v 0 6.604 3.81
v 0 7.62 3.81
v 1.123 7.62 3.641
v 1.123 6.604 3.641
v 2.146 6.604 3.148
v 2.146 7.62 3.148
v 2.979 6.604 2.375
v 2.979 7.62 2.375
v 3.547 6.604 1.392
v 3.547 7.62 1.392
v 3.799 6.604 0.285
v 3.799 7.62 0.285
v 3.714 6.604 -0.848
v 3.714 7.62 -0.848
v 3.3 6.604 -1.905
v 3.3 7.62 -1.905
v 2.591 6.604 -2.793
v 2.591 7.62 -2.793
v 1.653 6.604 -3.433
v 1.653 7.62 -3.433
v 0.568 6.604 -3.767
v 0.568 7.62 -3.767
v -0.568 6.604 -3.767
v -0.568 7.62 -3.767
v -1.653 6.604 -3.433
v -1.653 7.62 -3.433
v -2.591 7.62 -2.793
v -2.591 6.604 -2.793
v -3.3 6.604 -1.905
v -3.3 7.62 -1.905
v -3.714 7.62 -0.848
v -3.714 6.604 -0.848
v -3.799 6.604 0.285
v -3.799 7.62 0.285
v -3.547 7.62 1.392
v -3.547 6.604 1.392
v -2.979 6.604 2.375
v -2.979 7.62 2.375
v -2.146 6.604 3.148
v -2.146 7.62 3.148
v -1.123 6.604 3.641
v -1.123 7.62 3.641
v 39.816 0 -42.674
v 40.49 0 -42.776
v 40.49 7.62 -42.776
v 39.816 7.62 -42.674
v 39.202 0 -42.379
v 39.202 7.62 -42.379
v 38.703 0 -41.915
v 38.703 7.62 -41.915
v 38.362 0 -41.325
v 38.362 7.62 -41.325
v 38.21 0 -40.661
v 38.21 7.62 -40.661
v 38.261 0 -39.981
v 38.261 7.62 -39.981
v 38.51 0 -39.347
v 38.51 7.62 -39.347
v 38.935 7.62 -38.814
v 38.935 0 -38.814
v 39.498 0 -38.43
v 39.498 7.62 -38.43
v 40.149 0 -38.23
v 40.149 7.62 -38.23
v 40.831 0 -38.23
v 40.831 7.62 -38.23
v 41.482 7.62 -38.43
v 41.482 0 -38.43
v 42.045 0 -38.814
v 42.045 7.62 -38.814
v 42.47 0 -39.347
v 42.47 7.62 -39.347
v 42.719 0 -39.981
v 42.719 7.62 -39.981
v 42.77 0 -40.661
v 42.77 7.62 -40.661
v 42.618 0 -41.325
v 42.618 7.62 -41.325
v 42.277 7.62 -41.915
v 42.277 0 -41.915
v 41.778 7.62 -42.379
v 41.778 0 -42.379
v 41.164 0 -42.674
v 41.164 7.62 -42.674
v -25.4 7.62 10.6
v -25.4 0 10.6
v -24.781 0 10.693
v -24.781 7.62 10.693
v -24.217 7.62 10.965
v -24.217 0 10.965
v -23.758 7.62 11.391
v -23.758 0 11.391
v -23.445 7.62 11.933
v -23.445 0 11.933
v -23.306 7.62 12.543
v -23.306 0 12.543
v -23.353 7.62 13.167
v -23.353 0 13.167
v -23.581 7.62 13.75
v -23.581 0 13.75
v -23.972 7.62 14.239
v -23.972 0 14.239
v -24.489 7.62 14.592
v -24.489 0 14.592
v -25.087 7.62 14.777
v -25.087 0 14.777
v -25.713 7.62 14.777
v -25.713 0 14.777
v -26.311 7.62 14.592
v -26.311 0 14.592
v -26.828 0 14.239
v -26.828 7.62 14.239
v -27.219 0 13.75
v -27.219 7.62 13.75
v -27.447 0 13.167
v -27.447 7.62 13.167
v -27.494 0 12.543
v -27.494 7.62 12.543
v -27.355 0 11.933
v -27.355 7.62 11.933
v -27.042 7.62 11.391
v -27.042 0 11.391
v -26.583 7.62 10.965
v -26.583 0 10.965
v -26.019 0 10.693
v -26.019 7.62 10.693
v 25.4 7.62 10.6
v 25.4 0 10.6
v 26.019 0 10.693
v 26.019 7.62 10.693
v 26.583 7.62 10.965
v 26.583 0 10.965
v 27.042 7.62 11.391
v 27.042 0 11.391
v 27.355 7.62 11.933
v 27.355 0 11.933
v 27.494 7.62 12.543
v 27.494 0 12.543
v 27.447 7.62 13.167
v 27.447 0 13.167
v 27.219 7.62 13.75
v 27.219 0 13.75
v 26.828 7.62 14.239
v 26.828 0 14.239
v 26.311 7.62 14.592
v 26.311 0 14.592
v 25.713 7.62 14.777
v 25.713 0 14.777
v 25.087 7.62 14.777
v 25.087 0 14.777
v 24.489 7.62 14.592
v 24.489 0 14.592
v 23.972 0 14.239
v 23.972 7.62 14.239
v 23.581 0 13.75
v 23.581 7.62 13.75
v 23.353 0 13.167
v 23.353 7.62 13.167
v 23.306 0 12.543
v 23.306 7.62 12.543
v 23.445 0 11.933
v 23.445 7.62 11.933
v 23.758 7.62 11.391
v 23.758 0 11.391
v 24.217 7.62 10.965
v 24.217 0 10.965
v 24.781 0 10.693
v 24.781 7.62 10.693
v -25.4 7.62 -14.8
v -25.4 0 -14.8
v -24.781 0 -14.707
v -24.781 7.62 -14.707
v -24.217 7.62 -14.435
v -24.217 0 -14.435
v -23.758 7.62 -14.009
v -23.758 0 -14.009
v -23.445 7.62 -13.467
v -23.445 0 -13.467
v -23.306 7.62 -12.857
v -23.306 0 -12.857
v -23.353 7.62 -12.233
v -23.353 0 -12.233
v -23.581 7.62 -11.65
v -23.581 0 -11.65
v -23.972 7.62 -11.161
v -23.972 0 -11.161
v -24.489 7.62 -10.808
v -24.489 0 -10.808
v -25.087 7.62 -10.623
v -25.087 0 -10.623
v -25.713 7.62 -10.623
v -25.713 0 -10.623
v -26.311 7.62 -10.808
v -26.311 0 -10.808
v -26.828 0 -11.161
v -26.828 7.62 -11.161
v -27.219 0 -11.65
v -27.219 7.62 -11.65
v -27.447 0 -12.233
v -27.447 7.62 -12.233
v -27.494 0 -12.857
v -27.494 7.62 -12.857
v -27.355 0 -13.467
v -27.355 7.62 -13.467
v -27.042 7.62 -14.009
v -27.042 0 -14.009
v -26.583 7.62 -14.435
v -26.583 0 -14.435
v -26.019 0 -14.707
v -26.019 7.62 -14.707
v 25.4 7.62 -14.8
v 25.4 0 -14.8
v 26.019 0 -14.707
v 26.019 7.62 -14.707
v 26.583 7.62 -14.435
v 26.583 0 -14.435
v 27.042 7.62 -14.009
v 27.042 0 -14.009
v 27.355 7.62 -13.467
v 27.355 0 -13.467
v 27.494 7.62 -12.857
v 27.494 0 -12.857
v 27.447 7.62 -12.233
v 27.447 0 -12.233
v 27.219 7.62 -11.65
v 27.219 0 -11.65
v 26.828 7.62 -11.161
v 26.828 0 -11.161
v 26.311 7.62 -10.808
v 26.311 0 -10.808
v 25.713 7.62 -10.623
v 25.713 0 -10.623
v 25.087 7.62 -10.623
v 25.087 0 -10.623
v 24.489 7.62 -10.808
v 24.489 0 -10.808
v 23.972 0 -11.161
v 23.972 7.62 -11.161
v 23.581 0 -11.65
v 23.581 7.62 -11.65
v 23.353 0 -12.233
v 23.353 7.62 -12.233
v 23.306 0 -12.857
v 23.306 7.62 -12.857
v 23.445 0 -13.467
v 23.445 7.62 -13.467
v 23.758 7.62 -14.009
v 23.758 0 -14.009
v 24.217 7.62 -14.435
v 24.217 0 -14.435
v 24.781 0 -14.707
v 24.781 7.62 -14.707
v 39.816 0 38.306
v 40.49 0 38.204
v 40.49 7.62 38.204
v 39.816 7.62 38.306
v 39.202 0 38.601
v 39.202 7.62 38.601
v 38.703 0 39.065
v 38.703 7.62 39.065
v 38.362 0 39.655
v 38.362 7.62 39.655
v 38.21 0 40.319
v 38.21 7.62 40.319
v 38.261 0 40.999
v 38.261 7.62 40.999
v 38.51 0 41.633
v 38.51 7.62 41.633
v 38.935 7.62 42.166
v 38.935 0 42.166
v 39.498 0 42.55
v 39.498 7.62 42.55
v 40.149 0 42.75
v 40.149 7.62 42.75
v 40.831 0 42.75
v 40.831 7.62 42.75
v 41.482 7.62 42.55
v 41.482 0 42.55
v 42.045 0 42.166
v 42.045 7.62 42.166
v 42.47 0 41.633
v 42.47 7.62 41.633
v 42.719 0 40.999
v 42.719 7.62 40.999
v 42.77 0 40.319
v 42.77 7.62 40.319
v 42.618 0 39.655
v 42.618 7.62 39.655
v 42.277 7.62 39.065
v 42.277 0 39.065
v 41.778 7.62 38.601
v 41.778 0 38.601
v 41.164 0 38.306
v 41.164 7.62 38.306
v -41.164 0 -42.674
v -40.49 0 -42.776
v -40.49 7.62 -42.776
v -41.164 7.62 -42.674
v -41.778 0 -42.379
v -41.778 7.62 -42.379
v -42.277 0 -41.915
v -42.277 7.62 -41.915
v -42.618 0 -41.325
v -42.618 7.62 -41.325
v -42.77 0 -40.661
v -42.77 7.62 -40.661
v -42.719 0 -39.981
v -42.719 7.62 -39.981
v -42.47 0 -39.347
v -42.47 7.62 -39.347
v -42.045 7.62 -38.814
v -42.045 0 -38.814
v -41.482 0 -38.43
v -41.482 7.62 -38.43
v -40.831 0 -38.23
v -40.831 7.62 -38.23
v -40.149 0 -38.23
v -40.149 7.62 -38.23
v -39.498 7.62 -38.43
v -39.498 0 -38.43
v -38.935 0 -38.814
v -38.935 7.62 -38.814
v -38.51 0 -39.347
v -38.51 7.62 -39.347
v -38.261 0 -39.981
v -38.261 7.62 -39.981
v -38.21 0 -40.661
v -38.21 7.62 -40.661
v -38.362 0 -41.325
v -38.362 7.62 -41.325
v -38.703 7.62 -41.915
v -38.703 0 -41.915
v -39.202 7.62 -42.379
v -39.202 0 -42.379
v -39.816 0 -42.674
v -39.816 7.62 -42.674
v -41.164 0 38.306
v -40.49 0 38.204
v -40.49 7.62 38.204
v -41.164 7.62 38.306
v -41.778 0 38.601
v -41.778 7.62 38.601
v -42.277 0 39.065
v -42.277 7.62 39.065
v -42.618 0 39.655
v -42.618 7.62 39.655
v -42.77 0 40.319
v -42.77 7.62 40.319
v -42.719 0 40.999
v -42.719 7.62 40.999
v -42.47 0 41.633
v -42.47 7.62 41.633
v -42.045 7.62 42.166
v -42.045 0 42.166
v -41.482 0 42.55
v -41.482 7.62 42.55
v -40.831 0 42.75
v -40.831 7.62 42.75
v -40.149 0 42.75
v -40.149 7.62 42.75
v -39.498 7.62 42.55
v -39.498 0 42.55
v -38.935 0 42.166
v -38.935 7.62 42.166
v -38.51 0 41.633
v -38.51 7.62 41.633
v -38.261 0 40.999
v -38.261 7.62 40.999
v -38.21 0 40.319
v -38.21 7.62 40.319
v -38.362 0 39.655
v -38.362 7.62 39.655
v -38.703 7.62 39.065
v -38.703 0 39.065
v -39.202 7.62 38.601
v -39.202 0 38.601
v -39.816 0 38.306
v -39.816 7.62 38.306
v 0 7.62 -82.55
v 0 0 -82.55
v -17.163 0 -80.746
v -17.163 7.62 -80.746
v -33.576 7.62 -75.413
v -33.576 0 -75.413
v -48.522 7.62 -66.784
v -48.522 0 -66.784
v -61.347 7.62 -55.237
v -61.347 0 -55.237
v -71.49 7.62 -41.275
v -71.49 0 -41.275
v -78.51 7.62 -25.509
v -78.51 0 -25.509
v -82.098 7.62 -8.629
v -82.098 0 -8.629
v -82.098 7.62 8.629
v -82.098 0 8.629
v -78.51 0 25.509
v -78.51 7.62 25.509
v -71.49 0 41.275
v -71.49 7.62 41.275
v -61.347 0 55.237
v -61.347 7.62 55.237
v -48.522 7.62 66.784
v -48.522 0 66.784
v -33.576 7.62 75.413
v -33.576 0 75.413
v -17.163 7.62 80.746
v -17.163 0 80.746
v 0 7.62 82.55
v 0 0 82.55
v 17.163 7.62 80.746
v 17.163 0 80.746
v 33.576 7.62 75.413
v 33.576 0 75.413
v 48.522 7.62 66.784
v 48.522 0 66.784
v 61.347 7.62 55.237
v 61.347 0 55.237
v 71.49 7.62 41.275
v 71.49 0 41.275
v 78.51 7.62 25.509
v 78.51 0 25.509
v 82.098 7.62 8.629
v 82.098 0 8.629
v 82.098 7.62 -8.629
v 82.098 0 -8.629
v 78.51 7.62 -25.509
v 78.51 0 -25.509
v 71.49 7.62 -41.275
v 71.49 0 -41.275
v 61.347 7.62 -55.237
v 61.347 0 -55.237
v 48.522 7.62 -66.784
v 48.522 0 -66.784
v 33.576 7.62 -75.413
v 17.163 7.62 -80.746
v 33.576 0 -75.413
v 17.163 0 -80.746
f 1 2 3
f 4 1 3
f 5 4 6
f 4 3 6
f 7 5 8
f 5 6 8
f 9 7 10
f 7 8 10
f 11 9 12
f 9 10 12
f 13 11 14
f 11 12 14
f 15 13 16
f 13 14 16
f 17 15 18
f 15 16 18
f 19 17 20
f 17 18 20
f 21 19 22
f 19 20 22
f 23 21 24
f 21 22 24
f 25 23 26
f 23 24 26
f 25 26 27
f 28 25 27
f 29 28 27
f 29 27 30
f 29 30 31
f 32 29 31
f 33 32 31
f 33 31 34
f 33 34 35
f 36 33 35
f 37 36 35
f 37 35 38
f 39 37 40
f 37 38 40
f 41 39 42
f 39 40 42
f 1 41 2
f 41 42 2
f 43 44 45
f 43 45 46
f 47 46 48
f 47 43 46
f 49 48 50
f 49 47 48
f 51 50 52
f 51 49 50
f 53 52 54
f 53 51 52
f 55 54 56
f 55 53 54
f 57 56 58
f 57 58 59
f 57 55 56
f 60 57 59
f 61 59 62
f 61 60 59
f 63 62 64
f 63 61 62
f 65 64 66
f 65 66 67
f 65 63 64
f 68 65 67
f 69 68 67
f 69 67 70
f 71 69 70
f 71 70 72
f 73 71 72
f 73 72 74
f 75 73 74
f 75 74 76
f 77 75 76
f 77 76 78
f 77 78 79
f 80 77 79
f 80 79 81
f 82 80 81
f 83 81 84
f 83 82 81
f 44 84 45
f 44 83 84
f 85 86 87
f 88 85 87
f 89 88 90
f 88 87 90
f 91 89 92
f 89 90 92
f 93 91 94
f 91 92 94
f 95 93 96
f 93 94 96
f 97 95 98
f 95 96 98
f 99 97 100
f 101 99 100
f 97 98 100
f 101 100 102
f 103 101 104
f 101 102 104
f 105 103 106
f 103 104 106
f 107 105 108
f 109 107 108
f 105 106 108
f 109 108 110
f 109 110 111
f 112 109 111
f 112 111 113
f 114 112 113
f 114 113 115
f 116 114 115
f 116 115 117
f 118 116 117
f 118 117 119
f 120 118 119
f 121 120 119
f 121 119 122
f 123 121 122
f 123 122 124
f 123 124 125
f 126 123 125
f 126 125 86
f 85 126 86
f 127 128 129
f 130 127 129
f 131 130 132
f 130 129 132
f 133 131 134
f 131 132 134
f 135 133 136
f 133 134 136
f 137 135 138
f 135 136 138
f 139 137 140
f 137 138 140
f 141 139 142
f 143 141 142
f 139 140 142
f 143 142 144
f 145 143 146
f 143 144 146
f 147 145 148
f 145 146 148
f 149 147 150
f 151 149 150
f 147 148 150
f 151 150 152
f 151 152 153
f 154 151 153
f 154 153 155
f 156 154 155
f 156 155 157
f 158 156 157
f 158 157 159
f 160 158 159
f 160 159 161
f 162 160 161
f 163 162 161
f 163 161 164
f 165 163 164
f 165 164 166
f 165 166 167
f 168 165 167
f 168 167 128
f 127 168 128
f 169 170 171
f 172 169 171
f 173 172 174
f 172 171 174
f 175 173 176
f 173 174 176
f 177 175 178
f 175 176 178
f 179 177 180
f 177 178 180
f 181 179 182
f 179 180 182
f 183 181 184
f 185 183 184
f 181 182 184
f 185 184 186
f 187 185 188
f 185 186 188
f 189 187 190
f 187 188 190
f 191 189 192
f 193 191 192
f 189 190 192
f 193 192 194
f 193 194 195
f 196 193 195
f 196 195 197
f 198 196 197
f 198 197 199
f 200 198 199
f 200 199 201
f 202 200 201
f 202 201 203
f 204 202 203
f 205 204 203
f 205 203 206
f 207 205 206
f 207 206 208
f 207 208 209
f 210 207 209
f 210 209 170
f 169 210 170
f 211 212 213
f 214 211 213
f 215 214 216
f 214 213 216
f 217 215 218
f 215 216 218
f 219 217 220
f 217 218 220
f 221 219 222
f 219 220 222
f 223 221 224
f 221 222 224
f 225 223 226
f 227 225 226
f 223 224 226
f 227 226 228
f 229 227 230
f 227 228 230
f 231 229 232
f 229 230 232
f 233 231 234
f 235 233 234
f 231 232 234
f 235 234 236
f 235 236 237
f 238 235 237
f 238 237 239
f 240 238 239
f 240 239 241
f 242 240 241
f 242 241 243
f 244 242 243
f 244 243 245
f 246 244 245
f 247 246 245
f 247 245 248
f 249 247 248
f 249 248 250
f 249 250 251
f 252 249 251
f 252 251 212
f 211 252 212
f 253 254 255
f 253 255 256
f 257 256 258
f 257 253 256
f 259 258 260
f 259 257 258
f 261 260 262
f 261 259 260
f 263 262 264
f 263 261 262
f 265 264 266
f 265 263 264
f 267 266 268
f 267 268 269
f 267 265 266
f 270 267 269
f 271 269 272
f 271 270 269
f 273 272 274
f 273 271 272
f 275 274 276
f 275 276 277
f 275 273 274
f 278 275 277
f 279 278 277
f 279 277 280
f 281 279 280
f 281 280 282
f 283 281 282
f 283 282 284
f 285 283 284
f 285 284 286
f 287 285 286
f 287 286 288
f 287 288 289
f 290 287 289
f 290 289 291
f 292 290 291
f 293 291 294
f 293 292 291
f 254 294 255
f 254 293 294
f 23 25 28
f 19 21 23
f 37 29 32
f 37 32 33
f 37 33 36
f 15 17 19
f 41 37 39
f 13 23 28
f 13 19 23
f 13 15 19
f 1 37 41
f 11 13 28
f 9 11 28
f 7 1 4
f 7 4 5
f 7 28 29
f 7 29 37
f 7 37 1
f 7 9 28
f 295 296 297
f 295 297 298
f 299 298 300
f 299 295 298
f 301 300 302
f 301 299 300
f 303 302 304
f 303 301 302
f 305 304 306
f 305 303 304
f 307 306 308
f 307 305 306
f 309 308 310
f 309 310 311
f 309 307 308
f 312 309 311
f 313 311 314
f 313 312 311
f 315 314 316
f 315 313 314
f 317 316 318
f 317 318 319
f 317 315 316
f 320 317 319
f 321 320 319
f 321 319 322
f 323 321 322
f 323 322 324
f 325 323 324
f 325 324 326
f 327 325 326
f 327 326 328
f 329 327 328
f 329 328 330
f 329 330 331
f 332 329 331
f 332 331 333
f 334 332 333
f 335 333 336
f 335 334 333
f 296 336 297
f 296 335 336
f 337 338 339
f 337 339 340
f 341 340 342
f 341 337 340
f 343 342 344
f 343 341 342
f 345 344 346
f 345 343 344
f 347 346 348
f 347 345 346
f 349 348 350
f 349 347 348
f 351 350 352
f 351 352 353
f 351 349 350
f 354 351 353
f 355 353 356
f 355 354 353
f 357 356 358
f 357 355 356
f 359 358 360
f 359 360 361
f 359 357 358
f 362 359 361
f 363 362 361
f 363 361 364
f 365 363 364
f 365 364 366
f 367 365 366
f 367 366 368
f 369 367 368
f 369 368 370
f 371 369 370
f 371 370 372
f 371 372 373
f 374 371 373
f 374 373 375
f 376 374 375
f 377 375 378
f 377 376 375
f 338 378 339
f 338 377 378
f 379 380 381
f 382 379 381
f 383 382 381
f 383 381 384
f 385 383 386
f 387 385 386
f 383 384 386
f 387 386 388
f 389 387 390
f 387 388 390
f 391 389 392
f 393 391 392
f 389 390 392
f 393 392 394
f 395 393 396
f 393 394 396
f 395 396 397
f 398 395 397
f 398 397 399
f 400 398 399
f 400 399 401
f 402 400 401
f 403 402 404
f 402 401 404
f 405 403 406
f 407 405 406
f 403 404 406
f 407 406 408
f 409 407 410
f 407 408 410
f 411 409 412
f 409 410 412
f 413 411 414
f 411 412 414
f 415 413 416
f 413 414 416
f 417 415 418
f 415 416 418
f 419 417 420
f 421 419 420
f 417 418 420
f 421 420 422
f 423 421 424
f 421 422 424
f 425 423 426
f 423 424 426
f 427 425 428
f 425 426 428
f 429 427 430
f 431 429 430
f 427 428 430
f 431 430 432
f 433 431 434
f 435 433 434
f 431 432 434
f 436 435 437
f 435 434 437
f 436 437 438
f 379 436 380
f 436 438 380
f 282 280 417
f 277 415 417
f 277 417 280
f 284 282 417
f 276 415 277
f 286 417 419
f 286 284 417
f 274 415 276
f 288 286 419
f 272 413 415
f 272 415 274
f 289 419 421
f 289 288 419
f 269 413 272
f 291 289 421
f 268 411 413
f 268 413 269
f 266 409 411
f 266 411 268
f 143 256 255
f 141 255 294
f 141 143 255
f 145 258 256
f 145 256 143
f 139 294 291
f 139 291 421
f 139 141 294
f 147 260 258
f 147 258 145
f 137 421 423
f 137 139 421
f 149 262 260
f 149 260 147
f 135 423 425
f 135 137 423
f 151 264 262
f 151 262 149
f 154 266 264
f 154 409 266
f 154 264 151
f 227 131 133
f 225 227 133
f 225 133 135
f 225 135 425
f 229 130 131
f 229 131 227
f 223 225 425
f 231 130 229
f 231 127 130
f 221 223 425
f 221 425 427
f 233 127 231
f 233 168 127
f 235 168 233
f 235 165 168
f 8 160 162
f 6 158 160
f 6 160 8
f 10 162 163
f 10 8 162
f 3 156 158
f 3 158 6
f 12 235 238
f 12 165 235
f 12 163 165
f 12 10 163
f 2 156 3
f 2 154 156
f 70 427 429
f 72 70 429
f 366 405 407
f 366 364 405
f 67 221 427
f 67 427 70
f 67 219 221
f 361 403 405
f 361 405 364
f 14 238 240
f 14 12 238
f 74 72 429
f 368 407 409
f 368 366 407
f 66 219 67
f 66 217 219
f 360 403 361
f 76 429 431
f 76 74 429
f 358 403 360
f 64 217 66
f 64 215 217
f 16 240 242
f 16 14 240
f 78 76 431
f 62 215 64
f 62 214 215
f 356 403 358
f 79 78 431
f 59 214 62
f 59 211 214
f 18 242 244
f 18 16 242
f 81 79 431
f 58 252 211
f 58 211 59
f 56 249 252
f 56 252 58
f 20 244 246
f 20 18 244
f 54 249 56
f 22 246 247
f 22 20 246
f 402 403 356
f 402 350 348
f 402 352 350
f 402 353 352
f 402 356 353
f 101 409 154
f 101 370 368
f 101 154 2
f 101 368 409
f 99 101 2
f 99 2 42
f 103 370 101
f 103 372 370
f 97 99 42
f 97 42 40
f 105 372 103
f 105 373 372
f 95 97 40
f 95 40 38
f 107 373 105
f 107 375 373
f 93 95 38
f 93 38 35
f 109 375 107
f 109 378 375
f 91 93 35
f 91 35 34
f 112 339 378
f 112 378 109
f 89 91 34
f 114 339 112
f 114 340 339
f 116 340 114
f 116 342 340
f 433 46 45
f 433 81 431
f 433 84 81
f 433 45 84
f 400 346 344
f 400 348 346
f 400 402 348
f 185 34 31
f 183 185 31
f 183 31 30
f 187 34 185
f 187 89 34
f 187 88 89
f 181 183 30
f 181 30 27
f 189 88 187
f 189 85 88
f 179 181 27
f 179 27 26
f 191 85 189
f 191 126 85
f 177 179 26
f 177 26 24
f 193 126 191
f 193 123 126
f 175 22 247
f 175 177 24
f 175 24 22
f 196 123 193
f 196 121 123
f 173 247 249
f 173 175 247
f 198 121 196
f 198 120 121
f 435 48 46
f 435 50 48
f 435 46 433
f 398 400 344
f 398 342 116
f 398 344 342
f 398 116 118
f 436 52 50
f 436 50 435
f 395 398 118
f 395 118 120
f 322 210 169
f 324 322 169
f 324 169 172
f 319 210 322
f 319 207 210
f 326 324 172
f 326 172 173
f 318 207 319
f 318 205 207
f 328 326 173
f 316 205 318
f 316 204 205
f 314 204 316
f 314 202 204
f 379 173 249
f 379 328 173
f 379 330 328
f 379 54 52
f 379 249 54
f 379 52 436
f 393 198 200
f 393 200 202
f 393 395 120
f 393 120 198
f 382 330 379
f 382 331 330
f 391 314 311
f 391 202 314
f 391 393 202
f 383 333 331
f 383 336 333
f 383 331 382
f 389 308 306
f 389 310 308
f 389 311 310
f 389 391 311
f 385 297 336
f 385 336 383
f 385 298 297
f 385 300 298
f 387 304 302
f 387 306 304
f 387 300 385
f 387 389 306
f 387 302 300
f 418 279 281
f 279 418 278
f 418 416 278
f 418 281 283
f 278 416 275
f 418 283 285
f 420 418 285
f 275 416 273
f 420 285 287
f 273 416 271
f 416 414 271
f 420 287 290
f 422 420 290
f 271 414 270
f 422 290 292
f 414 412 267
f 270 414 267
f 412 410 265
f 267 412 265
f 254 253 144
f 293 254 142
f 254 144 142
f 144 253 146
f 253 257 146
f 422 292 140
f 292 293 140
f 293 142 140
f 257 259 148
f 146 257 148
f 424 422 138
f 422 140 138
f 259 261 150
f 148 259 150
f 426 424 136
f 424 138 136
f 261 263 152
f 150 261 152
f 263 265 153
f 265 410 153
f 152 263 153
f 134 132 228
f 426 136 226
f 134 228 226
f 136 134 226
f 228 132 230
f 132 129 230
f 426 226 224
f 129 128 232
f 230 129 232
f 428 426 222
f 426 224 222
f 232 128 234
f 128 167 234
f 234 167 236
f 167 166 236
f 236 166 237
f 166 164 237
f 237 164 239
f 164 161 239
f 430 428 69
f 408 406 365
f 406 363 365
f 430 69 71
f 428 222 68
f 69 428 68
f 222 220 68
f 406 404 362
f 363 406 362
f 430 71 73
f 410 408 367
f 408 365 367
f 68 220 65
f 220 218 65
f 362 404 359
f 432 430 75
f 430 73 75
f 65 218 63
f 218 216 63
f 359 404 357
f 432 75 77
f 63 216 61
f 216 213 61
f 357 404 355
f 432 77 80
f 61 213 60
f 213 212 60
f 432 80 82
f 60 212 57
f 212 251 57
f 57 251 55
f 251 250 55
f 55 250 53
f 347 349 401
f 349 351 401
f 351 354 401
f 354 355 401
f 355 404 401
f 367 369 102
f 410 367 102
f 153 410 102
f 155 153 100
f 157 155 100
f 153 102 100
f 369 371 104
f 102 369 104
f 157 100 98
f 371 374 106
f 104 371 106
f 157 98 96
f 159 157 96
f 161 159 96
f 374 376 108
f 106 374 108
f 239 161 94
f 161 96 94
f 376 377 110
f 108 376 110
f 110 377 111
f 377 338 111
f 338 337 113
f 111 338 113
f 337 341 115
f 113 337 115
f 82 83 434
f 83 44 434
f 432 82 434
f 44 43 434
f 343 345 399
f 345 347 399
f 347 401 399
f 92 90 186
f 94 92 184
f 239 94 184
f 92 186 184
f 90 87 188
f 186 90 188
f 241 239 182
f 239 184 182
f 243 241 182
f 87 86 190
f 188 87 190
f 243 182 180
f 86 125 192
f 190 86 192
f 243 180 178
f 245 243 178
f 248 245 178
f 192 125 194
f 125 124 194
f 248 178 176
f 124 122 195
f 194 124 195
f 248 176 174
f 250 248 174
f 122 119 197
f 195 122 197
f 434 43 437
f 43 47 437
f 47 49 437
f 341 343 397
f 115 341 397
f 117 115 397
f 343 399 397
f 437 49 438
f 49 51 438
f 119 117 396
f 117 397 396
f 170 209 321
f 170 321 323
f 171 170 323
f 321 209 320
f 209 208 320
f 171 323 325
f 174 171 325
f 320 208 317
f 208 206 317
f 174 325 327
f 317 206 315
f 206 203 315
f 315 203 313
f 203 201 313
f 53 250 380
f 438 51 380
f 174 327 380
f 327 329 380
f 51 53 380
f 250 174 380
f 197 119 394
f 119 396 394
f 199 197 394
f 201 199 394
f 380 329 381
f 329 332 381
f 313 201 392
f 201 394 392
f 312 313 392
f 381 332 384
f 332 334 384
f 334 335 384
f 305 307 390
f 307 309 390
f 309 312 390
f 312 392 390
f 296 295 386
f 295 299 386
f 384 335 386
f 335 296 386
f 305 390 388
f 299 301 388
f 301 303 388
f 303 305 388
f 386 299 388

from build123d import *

# Parameters (mm, degrees)
SKETCH1_R           = 82.55
SKETCH1_R_2         = 2.286
BOSS_EXTRUDE2_DEPTH = 7.62
SKETCH2_R           = 3.81
CUT_EXTRUDE1_DEPTH  = 1.016
SKETCH3_R           = 2.1
CUT_EXTRUDE2_DEPTH  = 54.356


with BuildPart() as part:
    # Sketch1 → Boss-Extrude2 (new body)
    with BuildSketch(Plane(origin=(0, 0, 0), x_dir=(1, 0, 0), z_dir=(0, 1, 0))):
        with Locations(Location((0, 0, 0), (0, 0, 90))):
            Circle(SKETCH1_R)
        with Locations(Location((40.49, 40.49, 0), (0, 0, 90))):
            Circle(SKETCH1_R_2, mode=Mode.SUBTRACT)
        with Locations(Location((40.49, -40.49, 0), (0, 0, 90))):
            Circle(SKETCH1_R_2, mode=Mode.SUBTRACT)
        with Locations(Location((-40.49, -40.49, 0), (0, 0, 90))):
            Circle(SKETCH1_R_2, mode=Mode.SUBTRACT)
        with Locations(Location((-40.49, 40.49, 0), (0, 0, 90))):
            Circle(SKETCH1_R_2, mode=Mode.SUBTRACT)
    extrude(amount=BOSS_EXTRUDE2_DEPTH)

    # Sketch2 → Cut-Extrude1 (cut)
    with BuildSketch(Plane(origin=(0, 7.62, 0), x_dir=(1, 0, 0), z_dir=(0, 1, 0))):
        with Locations(Location((0, 0, 0), (0, 0, 270))):
            Circle(SKETCH2_R)
    extrude(amount=-CUT_EXTRUDE1_DEPTH, mode=Mode.SUBTRACT)

    # Sketch3 → Cut-Extrude2 (cut)
    with BuildSketch(Plane.XZ):
        with Locations(Location((-25.4, 12.7, 0), (0, 0, 270))):
            Circle(SKETCH3_R)
        with Locations(Location((25.4, 12.7, 0), (0, 0, 270))):
            Circle(SKETCH3_R)
        with Locations(Location((25.4, -12.7, 0), (0, 0, 270))):
            Circle(SKETCH3_R)
        with Locations(Location((-25.4, -12.7, 0), (0, 0, 270))):
            Circle(SKETCH3_R)
    extrude(amount=-CUT_EXTRUDE2_DEPTH, mode=Mode.SUBTRACT)


solid = part.part
